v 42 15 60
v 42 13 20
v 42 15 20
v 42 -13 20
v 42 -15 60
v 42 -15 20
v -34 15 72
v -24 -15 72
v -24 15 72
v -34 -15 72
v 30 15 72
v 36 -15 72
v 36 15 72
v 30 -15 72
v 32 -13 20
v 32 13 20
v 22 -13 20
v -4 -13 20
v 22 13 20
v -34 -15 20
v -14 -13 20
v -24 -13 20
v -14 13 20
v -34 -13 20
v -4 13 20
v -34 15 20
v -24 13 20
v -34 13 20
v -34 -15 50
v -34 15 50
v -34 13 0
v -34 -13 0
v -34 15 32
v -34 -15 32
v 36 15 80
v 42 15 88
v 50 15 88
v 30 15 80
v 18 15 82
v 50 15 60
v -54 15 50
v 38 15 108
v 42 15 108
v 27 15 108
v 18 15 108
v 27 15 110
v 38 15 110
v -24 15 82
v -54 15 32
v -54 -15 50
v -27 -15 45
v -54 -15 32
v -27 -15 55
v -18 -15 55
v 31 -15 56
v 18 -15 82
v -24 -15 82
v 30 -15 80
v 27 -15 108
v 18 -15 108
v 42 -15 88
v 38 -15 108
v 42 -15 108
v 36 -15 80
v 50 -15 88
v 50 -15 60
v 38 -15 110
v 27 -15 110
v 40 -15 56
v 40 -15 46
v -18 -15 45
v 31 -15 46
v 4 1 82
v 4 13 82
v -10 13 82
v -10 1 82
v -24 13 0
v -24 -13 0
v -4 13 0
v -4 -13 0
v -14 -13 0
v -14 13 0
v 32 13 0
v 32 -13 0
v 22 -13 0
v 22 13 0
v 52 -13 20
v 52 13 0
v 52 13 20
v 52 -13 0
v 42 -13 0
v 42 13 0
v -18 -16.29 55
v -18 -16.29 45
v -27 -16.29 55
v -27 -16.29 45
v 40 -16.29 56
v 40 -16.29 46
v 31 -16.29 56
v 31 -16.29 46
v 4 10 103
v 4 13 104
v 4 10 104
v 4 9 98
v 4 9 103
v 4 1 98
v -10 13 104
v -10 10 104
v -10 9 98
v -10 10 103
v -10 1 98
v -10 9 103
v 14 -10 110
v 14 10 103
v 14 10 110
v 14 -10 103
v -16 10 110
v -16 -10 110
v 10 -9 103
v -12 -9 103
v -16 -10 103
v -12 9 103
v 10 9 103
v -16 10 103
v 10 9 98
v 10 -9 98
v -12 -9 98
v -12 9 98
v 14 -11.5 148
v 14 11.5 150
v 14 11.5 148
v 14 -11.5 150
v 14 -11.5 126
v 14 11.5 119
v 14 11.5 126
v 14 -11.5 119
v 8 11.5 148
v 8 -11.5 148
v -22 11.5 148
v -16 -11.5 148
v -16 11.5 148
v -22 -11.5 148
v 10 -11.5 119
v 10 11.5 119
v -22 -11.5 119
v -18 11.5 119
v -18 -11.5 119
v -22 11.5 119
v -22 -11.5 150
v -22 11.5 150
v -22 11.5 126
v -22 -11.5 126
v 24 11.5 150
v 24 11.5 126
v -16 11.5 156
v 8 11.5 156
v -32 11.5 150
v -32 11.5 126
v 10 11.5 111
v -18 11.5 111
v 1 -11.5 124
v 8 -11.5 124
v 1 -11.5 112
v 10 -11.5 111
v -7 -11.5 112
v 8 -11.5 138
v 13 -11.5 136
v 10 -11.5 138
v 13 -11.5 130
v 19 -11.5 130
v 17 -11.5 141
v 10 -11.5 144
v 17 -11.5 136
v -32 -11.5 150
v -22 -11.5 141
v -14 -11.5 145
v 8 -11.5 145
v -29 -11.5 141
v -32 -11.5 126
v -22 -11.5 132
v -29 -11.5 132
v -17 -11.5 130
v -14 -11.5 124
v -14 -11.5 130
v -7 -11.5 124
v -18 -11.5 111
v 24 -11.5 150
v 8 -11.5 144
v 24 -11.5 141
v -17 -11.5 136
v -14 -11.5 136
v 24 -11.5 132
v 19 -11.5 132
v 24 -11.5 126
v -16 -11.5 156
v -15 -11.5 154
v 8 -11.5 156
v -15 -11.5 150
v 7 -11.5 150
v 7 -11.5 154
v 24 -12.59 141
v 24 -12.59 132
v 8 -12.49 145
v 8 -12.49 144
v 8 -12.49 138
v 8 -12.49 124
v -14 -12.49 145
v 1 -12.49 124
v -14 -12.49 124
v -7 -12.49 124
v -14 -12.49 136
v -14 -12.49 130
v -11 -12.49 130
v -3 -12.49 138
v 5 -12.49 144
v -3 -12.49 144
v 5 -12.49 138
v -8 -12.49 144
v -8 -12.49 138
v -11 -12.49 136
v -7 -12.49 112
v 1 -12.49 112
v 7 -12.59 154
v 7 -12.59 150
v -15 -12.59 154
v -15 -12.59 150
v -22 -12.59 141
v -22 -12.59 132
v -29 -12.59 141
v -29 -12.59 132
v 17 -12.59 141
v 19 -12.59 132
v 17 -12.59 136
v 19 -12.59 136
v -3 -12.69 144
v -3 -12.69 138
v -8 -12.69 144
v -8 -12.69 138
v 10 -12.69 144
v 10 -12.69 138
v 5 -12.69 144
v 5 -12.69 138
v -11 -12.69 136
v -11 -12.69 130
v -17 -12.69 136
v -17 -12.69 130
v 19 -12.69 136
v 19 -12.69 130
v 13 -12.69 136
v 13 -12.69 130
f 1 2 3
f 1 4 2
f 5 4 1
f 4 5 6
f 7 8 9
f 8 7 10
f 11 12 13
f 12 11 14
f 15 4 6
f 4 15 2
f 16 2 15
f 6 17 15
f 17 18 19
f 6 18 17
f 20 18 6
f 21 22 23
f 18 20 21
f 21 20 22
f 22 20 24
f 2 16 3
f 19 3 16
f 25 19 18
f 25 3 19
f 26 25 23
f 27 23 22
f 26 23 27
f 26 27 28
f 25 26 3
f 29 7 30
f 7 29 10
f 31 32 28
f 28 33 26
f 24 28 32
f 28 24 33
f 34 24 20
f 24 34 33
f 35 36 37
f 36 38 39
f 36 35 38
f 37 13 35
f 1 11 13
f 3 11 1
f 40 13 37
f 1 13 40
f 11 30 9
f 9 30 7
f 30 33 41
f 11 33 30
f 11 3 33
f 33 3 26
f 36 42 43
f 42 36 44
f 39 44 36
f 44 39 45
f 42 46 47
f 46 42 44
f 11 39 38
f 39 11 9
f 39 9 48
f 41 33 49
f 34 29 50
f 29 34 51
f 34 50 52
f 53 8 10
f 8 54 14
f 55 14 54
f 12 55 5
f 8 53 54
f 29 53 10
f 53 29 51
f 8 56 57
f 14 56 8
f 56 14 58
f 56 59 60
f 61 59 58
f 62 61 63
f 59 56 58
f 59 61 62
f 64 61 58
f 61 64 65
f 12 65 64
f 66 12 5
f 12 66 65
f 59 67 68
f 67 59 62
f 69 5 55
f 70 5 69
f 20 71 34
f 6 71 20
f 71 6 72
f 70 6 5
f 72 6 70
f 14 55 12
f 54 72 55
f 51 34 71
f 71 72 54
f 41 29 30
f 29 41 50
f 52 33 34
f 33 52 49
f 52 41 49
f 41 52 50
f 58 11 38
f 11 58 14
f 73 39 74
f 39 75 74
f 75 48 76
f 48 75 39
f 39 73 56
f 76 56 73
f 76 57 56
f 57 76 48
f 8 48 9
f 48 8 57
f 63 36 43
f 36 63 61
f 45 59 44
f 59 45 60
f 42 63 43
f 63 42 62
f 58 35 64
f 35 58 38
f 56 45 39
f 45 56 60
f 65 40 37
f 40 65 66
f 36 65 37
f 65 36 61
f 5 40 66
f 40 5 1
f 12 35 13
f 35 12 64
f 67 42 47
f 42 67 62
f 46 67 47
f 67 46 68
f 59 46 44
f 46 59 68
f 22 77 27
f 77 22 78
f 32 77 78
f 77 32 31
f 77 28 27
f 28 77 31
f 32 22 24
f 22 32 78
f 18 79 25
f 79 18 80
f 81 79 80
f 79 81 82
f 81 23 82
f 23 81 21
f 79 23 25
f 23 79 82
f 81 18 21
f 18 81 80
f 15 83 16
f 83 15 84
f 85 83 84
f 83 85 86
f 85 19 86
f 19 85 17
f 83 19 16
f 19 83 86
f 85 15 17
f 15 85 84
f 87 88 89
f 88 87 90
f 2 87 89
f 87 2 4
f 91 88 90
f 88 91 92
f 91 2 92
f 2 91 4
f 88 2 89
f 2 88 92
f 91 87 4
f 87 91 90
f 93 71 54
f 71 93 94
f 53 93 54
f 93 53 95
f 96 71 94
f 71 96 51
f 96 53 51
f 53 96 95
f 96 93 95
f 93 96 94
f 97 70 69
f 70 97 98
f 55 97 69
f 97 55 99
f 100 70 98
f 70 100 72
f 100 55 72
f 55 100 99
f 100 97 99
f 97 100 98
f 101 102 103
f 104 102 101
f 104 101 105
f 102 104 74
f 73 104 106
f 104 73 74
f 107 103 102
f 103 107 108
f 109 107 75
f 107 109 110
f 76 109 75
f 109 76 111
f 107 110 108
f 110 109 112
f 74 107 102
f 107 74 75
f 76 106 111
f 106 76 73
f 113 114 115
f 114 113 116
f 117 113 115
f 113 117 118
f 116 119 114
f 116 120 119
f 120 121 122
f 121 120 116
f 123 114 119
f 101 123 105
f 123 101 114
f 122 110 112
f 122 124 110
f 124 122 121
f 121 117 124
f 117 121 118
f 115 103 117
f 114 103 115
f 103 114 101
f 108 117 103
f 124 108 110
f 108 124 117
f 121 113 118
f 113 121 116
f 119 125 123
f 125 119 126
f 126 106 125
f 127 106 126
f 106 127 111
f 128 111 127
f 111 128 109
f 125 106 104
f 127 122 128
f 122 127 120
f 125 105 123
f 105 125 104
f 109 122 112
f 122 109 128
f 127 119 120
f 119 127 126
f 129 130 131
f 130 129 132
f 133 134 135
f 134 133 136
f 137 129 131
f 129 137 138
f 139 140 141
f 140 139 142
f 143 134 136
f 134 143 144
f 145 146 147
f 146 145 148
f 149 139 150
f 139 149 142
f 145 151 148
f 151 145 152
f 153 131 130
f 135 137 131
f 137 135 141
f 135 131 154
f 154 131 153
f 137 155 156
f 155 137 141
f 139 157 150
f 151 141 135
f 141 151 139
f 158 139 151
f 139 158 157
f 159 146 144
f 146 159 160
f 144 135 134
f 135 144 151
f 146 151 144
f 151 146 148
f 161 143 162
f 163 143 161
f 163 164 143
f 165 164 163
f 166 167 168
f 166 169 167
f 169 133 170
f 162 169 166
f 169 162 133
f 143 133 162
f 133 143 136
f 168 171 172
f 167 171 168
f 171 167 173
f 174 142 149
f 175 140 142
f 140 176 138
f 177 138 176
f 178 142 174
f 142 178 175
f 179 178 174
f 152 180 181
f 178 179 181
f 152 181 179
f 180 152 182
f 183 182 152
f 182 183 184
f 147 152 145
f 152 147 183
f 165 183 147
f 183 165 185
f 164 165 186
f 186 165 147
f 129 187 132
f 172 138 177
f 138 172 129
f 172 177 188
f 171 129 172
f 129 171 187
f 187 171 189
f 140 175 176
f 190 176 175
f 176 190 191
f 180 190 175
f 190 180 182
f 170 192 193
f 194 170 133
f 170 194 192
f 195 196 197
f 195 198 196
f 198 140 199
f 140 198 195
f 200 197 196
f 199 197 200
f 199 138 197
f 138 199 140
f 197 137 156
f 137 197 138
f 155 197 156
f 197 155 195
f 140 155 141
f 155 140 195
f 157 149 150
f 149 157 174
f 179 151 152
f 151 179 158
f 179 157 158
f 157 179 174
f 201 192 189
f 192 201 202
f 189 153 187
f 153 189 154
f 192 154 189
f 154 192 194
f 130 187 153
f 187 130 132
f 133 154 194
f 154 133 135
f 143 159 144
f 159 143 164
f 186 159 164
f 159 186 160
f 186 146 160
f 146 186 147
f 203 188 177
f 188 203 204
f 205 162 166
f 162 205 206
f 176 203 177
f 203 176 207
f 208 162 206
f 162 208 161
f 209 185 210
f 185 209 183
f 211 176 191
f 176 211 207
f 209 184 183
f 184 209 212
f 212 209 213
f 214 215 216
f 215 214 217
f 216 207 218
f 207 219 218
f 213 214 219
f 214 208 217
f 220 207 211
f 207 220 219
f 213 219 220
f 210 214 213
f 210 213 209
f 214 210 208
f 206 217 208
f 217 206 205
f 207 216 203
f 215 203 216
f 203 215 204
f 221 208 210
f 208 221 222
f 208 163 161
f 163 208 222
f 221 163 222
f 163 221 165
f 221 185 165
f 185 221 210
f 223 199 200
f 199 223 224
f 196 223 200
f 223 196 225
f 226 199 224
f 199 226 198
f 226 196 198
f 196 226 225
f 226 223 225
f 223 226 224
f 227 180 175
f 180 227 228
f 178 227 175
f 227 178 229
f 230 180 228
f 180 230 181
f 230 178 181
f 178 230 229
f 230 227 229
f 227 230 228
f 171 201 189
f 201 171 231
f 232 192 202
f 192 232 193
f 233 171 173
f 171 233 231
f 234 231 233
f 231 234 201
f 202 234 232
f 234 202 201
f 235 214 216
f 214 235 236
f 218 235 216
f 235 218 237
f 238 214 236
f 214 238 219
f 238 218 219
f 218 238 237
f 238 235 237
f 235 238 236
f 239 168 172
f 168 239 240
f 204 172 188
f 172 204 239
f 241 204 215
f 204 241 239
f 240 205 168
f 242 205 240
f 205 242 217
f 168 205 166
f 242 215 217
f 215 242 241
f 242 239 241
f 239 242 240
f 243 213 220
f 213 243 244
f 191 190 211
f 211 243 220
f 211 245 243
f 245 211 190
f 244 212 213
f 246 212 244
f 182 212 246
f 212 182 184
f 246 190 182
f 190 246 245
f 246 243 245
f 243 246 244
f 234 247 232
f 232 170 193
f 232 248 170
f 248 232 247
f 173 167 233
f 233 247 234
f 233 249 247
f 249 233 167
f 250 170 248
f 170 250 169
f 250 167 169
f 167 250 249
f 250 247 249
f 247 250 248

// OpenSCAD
// Lightbulb Marker - Version 005
// Chunky 3D voxel model; the reference's white sticker outline is not modeled.
// Changes from previous version:
// - Narrowed and stretched the orange body silhouette.
// - Replaced the large visible orange chimney with a small rear structural post.
// - Slimmed the legs and reduced the heavy gray socket.
// - Rebalanced the bulb into a wider, lower pixel-lobe shape.

eps = 0.01;
$fn = 32;

body_depth = 30;
leg_depth = 26;
post_depth = 12;
bulb_depth = 23;
detail_raise = 1.1;

orange = [0.84, 0.40, 0.26];
black = [0.02, 0.02, 0.02];
bulb_yellow = [1.00, 0.82, 0.38];
bulb_light = [1.00, 0.90, 0.58];
bulb_orange = [0.93, 0.54, 0.20];
bulb_red = [0.70, 0.22, 0.18];
base_gray = [0.60, 0.60, 0.55];
base_dark = [0.38, 0.39, 0.36];

// Rectangles are [x, z, width, height] in the front silhouette.
body_core = [
    [-34, 20, 76, 52],   // main body mass
    [-54, 32, 20, 18],   // left block protrusion
    [-24, 66, 54, 16],   // stepped upper back
    [18, 80, 24, 28],    // tall right shoulder
    [36, 60, 14, 28],    // right face block
    [27, 102, 11, 8]     // small top step
];

leg_blocks = [
    [-34, 0, 10, 20],
    [-14, 0, 10, 20],
    [22, 0, 10, 20],
    [42, 0, 10, 20]
];

eye_blocks = [
    [-27, 45, 9, 10],
    [31, 46, 9, 10]
];

socket_blocks = [
    [-16, 103, 30, 7],
    [-12, 98, 22, 6]
];

rear_post = [-10, 78, 14, 0, post_depth, 26];

bulb_blocks = [
    [-22, 119, 36, 29],  // central bulb body
    [-16, 148, 24, 8],   // flatter top cap
    [-32, 126, 10, 24],  // left side lobe
    [14, 126, 10, 24],   // right side lobe
    [-18, 111, 28, 9]    // lower bulb neck
];

bulb_light_blocks = [
    [-14, 124, 22, 21],
    [-7, 112, 8, 12]
];

bulb_orange_blocks = [
    [-15, 150, 22, 4],
    [-29, 132, 7, 9],
    [17, 132, 7, 9]
];

bulb_red_blocks = [
    [-8, 138, 5, 6],
    [5, 138, 5, 6],
    [-17, 130, 6, 6],
    [13, 130, 6, 6]
];

module block3d(x, z, w, d, h, col, y = 0) {
    color(col)
        translate([x, y - d / 2, z])
            cube([w, d, h]);
}

module blocks3d(rects, d, col) {
    union() {
        for (r = rects)
            block3d(r[0], r[1], r[2], d, r[3], col);
    }
}

module front_detail(x, z, w, h, base_depth, col, raise = detail_raise) {
    color(col)
        translate([x, -base_depth / 2 - raise + eps, z])
            cube([w, raise, h]);
}

module front_details(rects, base_depth, col, raise = detail_raise) {
    union() {
        for (r = rects)
            front_detail(r[0], r[1], r[2], r[3], base_depth, col, raise);
    }
}

module orange_body() {
    union() {
        blocks3d(body_core, body_depth, orange);
        blocks3d(leg_blocks, leg_depth, orange);
        block3d(rear_post[0], rear_post[1], rear_post[2], rear_post[4], rear_post[5], orange, 7);
        front_details(eye_blocks, body_depth, black, 1.3);
    }
}

module socket() {
    union() {
        block3d(socket_blocks[0][0], socket_blocks[0][1], socket_blocks[0][2], 20, socket_blocks[0][3], base_gray);
        block3d(socket_blocks[1][0], socket_blocks[1][1], socket_blocks[1][2], 18, socket_blocks[1][3], base_dark);
    }
}

module chunky_bulb() {
    union() {
        blocks3d(bulb_blocks, bulb_depth, bulb_yellow);
        front_details(bulb_light_blocks, bulb_depth, bulb_light, 1.0);
        front_details(bulb_orange_blocks, bulb_depth, bulb_orange, 1.1);
        front_details(bulb_red_blocks, bulb_depth, bulb_red, 1.2);
    }
}

module model() {
    union() {
        orange_body();
        socket();
        chunky_bulb();
    }
}

model();
